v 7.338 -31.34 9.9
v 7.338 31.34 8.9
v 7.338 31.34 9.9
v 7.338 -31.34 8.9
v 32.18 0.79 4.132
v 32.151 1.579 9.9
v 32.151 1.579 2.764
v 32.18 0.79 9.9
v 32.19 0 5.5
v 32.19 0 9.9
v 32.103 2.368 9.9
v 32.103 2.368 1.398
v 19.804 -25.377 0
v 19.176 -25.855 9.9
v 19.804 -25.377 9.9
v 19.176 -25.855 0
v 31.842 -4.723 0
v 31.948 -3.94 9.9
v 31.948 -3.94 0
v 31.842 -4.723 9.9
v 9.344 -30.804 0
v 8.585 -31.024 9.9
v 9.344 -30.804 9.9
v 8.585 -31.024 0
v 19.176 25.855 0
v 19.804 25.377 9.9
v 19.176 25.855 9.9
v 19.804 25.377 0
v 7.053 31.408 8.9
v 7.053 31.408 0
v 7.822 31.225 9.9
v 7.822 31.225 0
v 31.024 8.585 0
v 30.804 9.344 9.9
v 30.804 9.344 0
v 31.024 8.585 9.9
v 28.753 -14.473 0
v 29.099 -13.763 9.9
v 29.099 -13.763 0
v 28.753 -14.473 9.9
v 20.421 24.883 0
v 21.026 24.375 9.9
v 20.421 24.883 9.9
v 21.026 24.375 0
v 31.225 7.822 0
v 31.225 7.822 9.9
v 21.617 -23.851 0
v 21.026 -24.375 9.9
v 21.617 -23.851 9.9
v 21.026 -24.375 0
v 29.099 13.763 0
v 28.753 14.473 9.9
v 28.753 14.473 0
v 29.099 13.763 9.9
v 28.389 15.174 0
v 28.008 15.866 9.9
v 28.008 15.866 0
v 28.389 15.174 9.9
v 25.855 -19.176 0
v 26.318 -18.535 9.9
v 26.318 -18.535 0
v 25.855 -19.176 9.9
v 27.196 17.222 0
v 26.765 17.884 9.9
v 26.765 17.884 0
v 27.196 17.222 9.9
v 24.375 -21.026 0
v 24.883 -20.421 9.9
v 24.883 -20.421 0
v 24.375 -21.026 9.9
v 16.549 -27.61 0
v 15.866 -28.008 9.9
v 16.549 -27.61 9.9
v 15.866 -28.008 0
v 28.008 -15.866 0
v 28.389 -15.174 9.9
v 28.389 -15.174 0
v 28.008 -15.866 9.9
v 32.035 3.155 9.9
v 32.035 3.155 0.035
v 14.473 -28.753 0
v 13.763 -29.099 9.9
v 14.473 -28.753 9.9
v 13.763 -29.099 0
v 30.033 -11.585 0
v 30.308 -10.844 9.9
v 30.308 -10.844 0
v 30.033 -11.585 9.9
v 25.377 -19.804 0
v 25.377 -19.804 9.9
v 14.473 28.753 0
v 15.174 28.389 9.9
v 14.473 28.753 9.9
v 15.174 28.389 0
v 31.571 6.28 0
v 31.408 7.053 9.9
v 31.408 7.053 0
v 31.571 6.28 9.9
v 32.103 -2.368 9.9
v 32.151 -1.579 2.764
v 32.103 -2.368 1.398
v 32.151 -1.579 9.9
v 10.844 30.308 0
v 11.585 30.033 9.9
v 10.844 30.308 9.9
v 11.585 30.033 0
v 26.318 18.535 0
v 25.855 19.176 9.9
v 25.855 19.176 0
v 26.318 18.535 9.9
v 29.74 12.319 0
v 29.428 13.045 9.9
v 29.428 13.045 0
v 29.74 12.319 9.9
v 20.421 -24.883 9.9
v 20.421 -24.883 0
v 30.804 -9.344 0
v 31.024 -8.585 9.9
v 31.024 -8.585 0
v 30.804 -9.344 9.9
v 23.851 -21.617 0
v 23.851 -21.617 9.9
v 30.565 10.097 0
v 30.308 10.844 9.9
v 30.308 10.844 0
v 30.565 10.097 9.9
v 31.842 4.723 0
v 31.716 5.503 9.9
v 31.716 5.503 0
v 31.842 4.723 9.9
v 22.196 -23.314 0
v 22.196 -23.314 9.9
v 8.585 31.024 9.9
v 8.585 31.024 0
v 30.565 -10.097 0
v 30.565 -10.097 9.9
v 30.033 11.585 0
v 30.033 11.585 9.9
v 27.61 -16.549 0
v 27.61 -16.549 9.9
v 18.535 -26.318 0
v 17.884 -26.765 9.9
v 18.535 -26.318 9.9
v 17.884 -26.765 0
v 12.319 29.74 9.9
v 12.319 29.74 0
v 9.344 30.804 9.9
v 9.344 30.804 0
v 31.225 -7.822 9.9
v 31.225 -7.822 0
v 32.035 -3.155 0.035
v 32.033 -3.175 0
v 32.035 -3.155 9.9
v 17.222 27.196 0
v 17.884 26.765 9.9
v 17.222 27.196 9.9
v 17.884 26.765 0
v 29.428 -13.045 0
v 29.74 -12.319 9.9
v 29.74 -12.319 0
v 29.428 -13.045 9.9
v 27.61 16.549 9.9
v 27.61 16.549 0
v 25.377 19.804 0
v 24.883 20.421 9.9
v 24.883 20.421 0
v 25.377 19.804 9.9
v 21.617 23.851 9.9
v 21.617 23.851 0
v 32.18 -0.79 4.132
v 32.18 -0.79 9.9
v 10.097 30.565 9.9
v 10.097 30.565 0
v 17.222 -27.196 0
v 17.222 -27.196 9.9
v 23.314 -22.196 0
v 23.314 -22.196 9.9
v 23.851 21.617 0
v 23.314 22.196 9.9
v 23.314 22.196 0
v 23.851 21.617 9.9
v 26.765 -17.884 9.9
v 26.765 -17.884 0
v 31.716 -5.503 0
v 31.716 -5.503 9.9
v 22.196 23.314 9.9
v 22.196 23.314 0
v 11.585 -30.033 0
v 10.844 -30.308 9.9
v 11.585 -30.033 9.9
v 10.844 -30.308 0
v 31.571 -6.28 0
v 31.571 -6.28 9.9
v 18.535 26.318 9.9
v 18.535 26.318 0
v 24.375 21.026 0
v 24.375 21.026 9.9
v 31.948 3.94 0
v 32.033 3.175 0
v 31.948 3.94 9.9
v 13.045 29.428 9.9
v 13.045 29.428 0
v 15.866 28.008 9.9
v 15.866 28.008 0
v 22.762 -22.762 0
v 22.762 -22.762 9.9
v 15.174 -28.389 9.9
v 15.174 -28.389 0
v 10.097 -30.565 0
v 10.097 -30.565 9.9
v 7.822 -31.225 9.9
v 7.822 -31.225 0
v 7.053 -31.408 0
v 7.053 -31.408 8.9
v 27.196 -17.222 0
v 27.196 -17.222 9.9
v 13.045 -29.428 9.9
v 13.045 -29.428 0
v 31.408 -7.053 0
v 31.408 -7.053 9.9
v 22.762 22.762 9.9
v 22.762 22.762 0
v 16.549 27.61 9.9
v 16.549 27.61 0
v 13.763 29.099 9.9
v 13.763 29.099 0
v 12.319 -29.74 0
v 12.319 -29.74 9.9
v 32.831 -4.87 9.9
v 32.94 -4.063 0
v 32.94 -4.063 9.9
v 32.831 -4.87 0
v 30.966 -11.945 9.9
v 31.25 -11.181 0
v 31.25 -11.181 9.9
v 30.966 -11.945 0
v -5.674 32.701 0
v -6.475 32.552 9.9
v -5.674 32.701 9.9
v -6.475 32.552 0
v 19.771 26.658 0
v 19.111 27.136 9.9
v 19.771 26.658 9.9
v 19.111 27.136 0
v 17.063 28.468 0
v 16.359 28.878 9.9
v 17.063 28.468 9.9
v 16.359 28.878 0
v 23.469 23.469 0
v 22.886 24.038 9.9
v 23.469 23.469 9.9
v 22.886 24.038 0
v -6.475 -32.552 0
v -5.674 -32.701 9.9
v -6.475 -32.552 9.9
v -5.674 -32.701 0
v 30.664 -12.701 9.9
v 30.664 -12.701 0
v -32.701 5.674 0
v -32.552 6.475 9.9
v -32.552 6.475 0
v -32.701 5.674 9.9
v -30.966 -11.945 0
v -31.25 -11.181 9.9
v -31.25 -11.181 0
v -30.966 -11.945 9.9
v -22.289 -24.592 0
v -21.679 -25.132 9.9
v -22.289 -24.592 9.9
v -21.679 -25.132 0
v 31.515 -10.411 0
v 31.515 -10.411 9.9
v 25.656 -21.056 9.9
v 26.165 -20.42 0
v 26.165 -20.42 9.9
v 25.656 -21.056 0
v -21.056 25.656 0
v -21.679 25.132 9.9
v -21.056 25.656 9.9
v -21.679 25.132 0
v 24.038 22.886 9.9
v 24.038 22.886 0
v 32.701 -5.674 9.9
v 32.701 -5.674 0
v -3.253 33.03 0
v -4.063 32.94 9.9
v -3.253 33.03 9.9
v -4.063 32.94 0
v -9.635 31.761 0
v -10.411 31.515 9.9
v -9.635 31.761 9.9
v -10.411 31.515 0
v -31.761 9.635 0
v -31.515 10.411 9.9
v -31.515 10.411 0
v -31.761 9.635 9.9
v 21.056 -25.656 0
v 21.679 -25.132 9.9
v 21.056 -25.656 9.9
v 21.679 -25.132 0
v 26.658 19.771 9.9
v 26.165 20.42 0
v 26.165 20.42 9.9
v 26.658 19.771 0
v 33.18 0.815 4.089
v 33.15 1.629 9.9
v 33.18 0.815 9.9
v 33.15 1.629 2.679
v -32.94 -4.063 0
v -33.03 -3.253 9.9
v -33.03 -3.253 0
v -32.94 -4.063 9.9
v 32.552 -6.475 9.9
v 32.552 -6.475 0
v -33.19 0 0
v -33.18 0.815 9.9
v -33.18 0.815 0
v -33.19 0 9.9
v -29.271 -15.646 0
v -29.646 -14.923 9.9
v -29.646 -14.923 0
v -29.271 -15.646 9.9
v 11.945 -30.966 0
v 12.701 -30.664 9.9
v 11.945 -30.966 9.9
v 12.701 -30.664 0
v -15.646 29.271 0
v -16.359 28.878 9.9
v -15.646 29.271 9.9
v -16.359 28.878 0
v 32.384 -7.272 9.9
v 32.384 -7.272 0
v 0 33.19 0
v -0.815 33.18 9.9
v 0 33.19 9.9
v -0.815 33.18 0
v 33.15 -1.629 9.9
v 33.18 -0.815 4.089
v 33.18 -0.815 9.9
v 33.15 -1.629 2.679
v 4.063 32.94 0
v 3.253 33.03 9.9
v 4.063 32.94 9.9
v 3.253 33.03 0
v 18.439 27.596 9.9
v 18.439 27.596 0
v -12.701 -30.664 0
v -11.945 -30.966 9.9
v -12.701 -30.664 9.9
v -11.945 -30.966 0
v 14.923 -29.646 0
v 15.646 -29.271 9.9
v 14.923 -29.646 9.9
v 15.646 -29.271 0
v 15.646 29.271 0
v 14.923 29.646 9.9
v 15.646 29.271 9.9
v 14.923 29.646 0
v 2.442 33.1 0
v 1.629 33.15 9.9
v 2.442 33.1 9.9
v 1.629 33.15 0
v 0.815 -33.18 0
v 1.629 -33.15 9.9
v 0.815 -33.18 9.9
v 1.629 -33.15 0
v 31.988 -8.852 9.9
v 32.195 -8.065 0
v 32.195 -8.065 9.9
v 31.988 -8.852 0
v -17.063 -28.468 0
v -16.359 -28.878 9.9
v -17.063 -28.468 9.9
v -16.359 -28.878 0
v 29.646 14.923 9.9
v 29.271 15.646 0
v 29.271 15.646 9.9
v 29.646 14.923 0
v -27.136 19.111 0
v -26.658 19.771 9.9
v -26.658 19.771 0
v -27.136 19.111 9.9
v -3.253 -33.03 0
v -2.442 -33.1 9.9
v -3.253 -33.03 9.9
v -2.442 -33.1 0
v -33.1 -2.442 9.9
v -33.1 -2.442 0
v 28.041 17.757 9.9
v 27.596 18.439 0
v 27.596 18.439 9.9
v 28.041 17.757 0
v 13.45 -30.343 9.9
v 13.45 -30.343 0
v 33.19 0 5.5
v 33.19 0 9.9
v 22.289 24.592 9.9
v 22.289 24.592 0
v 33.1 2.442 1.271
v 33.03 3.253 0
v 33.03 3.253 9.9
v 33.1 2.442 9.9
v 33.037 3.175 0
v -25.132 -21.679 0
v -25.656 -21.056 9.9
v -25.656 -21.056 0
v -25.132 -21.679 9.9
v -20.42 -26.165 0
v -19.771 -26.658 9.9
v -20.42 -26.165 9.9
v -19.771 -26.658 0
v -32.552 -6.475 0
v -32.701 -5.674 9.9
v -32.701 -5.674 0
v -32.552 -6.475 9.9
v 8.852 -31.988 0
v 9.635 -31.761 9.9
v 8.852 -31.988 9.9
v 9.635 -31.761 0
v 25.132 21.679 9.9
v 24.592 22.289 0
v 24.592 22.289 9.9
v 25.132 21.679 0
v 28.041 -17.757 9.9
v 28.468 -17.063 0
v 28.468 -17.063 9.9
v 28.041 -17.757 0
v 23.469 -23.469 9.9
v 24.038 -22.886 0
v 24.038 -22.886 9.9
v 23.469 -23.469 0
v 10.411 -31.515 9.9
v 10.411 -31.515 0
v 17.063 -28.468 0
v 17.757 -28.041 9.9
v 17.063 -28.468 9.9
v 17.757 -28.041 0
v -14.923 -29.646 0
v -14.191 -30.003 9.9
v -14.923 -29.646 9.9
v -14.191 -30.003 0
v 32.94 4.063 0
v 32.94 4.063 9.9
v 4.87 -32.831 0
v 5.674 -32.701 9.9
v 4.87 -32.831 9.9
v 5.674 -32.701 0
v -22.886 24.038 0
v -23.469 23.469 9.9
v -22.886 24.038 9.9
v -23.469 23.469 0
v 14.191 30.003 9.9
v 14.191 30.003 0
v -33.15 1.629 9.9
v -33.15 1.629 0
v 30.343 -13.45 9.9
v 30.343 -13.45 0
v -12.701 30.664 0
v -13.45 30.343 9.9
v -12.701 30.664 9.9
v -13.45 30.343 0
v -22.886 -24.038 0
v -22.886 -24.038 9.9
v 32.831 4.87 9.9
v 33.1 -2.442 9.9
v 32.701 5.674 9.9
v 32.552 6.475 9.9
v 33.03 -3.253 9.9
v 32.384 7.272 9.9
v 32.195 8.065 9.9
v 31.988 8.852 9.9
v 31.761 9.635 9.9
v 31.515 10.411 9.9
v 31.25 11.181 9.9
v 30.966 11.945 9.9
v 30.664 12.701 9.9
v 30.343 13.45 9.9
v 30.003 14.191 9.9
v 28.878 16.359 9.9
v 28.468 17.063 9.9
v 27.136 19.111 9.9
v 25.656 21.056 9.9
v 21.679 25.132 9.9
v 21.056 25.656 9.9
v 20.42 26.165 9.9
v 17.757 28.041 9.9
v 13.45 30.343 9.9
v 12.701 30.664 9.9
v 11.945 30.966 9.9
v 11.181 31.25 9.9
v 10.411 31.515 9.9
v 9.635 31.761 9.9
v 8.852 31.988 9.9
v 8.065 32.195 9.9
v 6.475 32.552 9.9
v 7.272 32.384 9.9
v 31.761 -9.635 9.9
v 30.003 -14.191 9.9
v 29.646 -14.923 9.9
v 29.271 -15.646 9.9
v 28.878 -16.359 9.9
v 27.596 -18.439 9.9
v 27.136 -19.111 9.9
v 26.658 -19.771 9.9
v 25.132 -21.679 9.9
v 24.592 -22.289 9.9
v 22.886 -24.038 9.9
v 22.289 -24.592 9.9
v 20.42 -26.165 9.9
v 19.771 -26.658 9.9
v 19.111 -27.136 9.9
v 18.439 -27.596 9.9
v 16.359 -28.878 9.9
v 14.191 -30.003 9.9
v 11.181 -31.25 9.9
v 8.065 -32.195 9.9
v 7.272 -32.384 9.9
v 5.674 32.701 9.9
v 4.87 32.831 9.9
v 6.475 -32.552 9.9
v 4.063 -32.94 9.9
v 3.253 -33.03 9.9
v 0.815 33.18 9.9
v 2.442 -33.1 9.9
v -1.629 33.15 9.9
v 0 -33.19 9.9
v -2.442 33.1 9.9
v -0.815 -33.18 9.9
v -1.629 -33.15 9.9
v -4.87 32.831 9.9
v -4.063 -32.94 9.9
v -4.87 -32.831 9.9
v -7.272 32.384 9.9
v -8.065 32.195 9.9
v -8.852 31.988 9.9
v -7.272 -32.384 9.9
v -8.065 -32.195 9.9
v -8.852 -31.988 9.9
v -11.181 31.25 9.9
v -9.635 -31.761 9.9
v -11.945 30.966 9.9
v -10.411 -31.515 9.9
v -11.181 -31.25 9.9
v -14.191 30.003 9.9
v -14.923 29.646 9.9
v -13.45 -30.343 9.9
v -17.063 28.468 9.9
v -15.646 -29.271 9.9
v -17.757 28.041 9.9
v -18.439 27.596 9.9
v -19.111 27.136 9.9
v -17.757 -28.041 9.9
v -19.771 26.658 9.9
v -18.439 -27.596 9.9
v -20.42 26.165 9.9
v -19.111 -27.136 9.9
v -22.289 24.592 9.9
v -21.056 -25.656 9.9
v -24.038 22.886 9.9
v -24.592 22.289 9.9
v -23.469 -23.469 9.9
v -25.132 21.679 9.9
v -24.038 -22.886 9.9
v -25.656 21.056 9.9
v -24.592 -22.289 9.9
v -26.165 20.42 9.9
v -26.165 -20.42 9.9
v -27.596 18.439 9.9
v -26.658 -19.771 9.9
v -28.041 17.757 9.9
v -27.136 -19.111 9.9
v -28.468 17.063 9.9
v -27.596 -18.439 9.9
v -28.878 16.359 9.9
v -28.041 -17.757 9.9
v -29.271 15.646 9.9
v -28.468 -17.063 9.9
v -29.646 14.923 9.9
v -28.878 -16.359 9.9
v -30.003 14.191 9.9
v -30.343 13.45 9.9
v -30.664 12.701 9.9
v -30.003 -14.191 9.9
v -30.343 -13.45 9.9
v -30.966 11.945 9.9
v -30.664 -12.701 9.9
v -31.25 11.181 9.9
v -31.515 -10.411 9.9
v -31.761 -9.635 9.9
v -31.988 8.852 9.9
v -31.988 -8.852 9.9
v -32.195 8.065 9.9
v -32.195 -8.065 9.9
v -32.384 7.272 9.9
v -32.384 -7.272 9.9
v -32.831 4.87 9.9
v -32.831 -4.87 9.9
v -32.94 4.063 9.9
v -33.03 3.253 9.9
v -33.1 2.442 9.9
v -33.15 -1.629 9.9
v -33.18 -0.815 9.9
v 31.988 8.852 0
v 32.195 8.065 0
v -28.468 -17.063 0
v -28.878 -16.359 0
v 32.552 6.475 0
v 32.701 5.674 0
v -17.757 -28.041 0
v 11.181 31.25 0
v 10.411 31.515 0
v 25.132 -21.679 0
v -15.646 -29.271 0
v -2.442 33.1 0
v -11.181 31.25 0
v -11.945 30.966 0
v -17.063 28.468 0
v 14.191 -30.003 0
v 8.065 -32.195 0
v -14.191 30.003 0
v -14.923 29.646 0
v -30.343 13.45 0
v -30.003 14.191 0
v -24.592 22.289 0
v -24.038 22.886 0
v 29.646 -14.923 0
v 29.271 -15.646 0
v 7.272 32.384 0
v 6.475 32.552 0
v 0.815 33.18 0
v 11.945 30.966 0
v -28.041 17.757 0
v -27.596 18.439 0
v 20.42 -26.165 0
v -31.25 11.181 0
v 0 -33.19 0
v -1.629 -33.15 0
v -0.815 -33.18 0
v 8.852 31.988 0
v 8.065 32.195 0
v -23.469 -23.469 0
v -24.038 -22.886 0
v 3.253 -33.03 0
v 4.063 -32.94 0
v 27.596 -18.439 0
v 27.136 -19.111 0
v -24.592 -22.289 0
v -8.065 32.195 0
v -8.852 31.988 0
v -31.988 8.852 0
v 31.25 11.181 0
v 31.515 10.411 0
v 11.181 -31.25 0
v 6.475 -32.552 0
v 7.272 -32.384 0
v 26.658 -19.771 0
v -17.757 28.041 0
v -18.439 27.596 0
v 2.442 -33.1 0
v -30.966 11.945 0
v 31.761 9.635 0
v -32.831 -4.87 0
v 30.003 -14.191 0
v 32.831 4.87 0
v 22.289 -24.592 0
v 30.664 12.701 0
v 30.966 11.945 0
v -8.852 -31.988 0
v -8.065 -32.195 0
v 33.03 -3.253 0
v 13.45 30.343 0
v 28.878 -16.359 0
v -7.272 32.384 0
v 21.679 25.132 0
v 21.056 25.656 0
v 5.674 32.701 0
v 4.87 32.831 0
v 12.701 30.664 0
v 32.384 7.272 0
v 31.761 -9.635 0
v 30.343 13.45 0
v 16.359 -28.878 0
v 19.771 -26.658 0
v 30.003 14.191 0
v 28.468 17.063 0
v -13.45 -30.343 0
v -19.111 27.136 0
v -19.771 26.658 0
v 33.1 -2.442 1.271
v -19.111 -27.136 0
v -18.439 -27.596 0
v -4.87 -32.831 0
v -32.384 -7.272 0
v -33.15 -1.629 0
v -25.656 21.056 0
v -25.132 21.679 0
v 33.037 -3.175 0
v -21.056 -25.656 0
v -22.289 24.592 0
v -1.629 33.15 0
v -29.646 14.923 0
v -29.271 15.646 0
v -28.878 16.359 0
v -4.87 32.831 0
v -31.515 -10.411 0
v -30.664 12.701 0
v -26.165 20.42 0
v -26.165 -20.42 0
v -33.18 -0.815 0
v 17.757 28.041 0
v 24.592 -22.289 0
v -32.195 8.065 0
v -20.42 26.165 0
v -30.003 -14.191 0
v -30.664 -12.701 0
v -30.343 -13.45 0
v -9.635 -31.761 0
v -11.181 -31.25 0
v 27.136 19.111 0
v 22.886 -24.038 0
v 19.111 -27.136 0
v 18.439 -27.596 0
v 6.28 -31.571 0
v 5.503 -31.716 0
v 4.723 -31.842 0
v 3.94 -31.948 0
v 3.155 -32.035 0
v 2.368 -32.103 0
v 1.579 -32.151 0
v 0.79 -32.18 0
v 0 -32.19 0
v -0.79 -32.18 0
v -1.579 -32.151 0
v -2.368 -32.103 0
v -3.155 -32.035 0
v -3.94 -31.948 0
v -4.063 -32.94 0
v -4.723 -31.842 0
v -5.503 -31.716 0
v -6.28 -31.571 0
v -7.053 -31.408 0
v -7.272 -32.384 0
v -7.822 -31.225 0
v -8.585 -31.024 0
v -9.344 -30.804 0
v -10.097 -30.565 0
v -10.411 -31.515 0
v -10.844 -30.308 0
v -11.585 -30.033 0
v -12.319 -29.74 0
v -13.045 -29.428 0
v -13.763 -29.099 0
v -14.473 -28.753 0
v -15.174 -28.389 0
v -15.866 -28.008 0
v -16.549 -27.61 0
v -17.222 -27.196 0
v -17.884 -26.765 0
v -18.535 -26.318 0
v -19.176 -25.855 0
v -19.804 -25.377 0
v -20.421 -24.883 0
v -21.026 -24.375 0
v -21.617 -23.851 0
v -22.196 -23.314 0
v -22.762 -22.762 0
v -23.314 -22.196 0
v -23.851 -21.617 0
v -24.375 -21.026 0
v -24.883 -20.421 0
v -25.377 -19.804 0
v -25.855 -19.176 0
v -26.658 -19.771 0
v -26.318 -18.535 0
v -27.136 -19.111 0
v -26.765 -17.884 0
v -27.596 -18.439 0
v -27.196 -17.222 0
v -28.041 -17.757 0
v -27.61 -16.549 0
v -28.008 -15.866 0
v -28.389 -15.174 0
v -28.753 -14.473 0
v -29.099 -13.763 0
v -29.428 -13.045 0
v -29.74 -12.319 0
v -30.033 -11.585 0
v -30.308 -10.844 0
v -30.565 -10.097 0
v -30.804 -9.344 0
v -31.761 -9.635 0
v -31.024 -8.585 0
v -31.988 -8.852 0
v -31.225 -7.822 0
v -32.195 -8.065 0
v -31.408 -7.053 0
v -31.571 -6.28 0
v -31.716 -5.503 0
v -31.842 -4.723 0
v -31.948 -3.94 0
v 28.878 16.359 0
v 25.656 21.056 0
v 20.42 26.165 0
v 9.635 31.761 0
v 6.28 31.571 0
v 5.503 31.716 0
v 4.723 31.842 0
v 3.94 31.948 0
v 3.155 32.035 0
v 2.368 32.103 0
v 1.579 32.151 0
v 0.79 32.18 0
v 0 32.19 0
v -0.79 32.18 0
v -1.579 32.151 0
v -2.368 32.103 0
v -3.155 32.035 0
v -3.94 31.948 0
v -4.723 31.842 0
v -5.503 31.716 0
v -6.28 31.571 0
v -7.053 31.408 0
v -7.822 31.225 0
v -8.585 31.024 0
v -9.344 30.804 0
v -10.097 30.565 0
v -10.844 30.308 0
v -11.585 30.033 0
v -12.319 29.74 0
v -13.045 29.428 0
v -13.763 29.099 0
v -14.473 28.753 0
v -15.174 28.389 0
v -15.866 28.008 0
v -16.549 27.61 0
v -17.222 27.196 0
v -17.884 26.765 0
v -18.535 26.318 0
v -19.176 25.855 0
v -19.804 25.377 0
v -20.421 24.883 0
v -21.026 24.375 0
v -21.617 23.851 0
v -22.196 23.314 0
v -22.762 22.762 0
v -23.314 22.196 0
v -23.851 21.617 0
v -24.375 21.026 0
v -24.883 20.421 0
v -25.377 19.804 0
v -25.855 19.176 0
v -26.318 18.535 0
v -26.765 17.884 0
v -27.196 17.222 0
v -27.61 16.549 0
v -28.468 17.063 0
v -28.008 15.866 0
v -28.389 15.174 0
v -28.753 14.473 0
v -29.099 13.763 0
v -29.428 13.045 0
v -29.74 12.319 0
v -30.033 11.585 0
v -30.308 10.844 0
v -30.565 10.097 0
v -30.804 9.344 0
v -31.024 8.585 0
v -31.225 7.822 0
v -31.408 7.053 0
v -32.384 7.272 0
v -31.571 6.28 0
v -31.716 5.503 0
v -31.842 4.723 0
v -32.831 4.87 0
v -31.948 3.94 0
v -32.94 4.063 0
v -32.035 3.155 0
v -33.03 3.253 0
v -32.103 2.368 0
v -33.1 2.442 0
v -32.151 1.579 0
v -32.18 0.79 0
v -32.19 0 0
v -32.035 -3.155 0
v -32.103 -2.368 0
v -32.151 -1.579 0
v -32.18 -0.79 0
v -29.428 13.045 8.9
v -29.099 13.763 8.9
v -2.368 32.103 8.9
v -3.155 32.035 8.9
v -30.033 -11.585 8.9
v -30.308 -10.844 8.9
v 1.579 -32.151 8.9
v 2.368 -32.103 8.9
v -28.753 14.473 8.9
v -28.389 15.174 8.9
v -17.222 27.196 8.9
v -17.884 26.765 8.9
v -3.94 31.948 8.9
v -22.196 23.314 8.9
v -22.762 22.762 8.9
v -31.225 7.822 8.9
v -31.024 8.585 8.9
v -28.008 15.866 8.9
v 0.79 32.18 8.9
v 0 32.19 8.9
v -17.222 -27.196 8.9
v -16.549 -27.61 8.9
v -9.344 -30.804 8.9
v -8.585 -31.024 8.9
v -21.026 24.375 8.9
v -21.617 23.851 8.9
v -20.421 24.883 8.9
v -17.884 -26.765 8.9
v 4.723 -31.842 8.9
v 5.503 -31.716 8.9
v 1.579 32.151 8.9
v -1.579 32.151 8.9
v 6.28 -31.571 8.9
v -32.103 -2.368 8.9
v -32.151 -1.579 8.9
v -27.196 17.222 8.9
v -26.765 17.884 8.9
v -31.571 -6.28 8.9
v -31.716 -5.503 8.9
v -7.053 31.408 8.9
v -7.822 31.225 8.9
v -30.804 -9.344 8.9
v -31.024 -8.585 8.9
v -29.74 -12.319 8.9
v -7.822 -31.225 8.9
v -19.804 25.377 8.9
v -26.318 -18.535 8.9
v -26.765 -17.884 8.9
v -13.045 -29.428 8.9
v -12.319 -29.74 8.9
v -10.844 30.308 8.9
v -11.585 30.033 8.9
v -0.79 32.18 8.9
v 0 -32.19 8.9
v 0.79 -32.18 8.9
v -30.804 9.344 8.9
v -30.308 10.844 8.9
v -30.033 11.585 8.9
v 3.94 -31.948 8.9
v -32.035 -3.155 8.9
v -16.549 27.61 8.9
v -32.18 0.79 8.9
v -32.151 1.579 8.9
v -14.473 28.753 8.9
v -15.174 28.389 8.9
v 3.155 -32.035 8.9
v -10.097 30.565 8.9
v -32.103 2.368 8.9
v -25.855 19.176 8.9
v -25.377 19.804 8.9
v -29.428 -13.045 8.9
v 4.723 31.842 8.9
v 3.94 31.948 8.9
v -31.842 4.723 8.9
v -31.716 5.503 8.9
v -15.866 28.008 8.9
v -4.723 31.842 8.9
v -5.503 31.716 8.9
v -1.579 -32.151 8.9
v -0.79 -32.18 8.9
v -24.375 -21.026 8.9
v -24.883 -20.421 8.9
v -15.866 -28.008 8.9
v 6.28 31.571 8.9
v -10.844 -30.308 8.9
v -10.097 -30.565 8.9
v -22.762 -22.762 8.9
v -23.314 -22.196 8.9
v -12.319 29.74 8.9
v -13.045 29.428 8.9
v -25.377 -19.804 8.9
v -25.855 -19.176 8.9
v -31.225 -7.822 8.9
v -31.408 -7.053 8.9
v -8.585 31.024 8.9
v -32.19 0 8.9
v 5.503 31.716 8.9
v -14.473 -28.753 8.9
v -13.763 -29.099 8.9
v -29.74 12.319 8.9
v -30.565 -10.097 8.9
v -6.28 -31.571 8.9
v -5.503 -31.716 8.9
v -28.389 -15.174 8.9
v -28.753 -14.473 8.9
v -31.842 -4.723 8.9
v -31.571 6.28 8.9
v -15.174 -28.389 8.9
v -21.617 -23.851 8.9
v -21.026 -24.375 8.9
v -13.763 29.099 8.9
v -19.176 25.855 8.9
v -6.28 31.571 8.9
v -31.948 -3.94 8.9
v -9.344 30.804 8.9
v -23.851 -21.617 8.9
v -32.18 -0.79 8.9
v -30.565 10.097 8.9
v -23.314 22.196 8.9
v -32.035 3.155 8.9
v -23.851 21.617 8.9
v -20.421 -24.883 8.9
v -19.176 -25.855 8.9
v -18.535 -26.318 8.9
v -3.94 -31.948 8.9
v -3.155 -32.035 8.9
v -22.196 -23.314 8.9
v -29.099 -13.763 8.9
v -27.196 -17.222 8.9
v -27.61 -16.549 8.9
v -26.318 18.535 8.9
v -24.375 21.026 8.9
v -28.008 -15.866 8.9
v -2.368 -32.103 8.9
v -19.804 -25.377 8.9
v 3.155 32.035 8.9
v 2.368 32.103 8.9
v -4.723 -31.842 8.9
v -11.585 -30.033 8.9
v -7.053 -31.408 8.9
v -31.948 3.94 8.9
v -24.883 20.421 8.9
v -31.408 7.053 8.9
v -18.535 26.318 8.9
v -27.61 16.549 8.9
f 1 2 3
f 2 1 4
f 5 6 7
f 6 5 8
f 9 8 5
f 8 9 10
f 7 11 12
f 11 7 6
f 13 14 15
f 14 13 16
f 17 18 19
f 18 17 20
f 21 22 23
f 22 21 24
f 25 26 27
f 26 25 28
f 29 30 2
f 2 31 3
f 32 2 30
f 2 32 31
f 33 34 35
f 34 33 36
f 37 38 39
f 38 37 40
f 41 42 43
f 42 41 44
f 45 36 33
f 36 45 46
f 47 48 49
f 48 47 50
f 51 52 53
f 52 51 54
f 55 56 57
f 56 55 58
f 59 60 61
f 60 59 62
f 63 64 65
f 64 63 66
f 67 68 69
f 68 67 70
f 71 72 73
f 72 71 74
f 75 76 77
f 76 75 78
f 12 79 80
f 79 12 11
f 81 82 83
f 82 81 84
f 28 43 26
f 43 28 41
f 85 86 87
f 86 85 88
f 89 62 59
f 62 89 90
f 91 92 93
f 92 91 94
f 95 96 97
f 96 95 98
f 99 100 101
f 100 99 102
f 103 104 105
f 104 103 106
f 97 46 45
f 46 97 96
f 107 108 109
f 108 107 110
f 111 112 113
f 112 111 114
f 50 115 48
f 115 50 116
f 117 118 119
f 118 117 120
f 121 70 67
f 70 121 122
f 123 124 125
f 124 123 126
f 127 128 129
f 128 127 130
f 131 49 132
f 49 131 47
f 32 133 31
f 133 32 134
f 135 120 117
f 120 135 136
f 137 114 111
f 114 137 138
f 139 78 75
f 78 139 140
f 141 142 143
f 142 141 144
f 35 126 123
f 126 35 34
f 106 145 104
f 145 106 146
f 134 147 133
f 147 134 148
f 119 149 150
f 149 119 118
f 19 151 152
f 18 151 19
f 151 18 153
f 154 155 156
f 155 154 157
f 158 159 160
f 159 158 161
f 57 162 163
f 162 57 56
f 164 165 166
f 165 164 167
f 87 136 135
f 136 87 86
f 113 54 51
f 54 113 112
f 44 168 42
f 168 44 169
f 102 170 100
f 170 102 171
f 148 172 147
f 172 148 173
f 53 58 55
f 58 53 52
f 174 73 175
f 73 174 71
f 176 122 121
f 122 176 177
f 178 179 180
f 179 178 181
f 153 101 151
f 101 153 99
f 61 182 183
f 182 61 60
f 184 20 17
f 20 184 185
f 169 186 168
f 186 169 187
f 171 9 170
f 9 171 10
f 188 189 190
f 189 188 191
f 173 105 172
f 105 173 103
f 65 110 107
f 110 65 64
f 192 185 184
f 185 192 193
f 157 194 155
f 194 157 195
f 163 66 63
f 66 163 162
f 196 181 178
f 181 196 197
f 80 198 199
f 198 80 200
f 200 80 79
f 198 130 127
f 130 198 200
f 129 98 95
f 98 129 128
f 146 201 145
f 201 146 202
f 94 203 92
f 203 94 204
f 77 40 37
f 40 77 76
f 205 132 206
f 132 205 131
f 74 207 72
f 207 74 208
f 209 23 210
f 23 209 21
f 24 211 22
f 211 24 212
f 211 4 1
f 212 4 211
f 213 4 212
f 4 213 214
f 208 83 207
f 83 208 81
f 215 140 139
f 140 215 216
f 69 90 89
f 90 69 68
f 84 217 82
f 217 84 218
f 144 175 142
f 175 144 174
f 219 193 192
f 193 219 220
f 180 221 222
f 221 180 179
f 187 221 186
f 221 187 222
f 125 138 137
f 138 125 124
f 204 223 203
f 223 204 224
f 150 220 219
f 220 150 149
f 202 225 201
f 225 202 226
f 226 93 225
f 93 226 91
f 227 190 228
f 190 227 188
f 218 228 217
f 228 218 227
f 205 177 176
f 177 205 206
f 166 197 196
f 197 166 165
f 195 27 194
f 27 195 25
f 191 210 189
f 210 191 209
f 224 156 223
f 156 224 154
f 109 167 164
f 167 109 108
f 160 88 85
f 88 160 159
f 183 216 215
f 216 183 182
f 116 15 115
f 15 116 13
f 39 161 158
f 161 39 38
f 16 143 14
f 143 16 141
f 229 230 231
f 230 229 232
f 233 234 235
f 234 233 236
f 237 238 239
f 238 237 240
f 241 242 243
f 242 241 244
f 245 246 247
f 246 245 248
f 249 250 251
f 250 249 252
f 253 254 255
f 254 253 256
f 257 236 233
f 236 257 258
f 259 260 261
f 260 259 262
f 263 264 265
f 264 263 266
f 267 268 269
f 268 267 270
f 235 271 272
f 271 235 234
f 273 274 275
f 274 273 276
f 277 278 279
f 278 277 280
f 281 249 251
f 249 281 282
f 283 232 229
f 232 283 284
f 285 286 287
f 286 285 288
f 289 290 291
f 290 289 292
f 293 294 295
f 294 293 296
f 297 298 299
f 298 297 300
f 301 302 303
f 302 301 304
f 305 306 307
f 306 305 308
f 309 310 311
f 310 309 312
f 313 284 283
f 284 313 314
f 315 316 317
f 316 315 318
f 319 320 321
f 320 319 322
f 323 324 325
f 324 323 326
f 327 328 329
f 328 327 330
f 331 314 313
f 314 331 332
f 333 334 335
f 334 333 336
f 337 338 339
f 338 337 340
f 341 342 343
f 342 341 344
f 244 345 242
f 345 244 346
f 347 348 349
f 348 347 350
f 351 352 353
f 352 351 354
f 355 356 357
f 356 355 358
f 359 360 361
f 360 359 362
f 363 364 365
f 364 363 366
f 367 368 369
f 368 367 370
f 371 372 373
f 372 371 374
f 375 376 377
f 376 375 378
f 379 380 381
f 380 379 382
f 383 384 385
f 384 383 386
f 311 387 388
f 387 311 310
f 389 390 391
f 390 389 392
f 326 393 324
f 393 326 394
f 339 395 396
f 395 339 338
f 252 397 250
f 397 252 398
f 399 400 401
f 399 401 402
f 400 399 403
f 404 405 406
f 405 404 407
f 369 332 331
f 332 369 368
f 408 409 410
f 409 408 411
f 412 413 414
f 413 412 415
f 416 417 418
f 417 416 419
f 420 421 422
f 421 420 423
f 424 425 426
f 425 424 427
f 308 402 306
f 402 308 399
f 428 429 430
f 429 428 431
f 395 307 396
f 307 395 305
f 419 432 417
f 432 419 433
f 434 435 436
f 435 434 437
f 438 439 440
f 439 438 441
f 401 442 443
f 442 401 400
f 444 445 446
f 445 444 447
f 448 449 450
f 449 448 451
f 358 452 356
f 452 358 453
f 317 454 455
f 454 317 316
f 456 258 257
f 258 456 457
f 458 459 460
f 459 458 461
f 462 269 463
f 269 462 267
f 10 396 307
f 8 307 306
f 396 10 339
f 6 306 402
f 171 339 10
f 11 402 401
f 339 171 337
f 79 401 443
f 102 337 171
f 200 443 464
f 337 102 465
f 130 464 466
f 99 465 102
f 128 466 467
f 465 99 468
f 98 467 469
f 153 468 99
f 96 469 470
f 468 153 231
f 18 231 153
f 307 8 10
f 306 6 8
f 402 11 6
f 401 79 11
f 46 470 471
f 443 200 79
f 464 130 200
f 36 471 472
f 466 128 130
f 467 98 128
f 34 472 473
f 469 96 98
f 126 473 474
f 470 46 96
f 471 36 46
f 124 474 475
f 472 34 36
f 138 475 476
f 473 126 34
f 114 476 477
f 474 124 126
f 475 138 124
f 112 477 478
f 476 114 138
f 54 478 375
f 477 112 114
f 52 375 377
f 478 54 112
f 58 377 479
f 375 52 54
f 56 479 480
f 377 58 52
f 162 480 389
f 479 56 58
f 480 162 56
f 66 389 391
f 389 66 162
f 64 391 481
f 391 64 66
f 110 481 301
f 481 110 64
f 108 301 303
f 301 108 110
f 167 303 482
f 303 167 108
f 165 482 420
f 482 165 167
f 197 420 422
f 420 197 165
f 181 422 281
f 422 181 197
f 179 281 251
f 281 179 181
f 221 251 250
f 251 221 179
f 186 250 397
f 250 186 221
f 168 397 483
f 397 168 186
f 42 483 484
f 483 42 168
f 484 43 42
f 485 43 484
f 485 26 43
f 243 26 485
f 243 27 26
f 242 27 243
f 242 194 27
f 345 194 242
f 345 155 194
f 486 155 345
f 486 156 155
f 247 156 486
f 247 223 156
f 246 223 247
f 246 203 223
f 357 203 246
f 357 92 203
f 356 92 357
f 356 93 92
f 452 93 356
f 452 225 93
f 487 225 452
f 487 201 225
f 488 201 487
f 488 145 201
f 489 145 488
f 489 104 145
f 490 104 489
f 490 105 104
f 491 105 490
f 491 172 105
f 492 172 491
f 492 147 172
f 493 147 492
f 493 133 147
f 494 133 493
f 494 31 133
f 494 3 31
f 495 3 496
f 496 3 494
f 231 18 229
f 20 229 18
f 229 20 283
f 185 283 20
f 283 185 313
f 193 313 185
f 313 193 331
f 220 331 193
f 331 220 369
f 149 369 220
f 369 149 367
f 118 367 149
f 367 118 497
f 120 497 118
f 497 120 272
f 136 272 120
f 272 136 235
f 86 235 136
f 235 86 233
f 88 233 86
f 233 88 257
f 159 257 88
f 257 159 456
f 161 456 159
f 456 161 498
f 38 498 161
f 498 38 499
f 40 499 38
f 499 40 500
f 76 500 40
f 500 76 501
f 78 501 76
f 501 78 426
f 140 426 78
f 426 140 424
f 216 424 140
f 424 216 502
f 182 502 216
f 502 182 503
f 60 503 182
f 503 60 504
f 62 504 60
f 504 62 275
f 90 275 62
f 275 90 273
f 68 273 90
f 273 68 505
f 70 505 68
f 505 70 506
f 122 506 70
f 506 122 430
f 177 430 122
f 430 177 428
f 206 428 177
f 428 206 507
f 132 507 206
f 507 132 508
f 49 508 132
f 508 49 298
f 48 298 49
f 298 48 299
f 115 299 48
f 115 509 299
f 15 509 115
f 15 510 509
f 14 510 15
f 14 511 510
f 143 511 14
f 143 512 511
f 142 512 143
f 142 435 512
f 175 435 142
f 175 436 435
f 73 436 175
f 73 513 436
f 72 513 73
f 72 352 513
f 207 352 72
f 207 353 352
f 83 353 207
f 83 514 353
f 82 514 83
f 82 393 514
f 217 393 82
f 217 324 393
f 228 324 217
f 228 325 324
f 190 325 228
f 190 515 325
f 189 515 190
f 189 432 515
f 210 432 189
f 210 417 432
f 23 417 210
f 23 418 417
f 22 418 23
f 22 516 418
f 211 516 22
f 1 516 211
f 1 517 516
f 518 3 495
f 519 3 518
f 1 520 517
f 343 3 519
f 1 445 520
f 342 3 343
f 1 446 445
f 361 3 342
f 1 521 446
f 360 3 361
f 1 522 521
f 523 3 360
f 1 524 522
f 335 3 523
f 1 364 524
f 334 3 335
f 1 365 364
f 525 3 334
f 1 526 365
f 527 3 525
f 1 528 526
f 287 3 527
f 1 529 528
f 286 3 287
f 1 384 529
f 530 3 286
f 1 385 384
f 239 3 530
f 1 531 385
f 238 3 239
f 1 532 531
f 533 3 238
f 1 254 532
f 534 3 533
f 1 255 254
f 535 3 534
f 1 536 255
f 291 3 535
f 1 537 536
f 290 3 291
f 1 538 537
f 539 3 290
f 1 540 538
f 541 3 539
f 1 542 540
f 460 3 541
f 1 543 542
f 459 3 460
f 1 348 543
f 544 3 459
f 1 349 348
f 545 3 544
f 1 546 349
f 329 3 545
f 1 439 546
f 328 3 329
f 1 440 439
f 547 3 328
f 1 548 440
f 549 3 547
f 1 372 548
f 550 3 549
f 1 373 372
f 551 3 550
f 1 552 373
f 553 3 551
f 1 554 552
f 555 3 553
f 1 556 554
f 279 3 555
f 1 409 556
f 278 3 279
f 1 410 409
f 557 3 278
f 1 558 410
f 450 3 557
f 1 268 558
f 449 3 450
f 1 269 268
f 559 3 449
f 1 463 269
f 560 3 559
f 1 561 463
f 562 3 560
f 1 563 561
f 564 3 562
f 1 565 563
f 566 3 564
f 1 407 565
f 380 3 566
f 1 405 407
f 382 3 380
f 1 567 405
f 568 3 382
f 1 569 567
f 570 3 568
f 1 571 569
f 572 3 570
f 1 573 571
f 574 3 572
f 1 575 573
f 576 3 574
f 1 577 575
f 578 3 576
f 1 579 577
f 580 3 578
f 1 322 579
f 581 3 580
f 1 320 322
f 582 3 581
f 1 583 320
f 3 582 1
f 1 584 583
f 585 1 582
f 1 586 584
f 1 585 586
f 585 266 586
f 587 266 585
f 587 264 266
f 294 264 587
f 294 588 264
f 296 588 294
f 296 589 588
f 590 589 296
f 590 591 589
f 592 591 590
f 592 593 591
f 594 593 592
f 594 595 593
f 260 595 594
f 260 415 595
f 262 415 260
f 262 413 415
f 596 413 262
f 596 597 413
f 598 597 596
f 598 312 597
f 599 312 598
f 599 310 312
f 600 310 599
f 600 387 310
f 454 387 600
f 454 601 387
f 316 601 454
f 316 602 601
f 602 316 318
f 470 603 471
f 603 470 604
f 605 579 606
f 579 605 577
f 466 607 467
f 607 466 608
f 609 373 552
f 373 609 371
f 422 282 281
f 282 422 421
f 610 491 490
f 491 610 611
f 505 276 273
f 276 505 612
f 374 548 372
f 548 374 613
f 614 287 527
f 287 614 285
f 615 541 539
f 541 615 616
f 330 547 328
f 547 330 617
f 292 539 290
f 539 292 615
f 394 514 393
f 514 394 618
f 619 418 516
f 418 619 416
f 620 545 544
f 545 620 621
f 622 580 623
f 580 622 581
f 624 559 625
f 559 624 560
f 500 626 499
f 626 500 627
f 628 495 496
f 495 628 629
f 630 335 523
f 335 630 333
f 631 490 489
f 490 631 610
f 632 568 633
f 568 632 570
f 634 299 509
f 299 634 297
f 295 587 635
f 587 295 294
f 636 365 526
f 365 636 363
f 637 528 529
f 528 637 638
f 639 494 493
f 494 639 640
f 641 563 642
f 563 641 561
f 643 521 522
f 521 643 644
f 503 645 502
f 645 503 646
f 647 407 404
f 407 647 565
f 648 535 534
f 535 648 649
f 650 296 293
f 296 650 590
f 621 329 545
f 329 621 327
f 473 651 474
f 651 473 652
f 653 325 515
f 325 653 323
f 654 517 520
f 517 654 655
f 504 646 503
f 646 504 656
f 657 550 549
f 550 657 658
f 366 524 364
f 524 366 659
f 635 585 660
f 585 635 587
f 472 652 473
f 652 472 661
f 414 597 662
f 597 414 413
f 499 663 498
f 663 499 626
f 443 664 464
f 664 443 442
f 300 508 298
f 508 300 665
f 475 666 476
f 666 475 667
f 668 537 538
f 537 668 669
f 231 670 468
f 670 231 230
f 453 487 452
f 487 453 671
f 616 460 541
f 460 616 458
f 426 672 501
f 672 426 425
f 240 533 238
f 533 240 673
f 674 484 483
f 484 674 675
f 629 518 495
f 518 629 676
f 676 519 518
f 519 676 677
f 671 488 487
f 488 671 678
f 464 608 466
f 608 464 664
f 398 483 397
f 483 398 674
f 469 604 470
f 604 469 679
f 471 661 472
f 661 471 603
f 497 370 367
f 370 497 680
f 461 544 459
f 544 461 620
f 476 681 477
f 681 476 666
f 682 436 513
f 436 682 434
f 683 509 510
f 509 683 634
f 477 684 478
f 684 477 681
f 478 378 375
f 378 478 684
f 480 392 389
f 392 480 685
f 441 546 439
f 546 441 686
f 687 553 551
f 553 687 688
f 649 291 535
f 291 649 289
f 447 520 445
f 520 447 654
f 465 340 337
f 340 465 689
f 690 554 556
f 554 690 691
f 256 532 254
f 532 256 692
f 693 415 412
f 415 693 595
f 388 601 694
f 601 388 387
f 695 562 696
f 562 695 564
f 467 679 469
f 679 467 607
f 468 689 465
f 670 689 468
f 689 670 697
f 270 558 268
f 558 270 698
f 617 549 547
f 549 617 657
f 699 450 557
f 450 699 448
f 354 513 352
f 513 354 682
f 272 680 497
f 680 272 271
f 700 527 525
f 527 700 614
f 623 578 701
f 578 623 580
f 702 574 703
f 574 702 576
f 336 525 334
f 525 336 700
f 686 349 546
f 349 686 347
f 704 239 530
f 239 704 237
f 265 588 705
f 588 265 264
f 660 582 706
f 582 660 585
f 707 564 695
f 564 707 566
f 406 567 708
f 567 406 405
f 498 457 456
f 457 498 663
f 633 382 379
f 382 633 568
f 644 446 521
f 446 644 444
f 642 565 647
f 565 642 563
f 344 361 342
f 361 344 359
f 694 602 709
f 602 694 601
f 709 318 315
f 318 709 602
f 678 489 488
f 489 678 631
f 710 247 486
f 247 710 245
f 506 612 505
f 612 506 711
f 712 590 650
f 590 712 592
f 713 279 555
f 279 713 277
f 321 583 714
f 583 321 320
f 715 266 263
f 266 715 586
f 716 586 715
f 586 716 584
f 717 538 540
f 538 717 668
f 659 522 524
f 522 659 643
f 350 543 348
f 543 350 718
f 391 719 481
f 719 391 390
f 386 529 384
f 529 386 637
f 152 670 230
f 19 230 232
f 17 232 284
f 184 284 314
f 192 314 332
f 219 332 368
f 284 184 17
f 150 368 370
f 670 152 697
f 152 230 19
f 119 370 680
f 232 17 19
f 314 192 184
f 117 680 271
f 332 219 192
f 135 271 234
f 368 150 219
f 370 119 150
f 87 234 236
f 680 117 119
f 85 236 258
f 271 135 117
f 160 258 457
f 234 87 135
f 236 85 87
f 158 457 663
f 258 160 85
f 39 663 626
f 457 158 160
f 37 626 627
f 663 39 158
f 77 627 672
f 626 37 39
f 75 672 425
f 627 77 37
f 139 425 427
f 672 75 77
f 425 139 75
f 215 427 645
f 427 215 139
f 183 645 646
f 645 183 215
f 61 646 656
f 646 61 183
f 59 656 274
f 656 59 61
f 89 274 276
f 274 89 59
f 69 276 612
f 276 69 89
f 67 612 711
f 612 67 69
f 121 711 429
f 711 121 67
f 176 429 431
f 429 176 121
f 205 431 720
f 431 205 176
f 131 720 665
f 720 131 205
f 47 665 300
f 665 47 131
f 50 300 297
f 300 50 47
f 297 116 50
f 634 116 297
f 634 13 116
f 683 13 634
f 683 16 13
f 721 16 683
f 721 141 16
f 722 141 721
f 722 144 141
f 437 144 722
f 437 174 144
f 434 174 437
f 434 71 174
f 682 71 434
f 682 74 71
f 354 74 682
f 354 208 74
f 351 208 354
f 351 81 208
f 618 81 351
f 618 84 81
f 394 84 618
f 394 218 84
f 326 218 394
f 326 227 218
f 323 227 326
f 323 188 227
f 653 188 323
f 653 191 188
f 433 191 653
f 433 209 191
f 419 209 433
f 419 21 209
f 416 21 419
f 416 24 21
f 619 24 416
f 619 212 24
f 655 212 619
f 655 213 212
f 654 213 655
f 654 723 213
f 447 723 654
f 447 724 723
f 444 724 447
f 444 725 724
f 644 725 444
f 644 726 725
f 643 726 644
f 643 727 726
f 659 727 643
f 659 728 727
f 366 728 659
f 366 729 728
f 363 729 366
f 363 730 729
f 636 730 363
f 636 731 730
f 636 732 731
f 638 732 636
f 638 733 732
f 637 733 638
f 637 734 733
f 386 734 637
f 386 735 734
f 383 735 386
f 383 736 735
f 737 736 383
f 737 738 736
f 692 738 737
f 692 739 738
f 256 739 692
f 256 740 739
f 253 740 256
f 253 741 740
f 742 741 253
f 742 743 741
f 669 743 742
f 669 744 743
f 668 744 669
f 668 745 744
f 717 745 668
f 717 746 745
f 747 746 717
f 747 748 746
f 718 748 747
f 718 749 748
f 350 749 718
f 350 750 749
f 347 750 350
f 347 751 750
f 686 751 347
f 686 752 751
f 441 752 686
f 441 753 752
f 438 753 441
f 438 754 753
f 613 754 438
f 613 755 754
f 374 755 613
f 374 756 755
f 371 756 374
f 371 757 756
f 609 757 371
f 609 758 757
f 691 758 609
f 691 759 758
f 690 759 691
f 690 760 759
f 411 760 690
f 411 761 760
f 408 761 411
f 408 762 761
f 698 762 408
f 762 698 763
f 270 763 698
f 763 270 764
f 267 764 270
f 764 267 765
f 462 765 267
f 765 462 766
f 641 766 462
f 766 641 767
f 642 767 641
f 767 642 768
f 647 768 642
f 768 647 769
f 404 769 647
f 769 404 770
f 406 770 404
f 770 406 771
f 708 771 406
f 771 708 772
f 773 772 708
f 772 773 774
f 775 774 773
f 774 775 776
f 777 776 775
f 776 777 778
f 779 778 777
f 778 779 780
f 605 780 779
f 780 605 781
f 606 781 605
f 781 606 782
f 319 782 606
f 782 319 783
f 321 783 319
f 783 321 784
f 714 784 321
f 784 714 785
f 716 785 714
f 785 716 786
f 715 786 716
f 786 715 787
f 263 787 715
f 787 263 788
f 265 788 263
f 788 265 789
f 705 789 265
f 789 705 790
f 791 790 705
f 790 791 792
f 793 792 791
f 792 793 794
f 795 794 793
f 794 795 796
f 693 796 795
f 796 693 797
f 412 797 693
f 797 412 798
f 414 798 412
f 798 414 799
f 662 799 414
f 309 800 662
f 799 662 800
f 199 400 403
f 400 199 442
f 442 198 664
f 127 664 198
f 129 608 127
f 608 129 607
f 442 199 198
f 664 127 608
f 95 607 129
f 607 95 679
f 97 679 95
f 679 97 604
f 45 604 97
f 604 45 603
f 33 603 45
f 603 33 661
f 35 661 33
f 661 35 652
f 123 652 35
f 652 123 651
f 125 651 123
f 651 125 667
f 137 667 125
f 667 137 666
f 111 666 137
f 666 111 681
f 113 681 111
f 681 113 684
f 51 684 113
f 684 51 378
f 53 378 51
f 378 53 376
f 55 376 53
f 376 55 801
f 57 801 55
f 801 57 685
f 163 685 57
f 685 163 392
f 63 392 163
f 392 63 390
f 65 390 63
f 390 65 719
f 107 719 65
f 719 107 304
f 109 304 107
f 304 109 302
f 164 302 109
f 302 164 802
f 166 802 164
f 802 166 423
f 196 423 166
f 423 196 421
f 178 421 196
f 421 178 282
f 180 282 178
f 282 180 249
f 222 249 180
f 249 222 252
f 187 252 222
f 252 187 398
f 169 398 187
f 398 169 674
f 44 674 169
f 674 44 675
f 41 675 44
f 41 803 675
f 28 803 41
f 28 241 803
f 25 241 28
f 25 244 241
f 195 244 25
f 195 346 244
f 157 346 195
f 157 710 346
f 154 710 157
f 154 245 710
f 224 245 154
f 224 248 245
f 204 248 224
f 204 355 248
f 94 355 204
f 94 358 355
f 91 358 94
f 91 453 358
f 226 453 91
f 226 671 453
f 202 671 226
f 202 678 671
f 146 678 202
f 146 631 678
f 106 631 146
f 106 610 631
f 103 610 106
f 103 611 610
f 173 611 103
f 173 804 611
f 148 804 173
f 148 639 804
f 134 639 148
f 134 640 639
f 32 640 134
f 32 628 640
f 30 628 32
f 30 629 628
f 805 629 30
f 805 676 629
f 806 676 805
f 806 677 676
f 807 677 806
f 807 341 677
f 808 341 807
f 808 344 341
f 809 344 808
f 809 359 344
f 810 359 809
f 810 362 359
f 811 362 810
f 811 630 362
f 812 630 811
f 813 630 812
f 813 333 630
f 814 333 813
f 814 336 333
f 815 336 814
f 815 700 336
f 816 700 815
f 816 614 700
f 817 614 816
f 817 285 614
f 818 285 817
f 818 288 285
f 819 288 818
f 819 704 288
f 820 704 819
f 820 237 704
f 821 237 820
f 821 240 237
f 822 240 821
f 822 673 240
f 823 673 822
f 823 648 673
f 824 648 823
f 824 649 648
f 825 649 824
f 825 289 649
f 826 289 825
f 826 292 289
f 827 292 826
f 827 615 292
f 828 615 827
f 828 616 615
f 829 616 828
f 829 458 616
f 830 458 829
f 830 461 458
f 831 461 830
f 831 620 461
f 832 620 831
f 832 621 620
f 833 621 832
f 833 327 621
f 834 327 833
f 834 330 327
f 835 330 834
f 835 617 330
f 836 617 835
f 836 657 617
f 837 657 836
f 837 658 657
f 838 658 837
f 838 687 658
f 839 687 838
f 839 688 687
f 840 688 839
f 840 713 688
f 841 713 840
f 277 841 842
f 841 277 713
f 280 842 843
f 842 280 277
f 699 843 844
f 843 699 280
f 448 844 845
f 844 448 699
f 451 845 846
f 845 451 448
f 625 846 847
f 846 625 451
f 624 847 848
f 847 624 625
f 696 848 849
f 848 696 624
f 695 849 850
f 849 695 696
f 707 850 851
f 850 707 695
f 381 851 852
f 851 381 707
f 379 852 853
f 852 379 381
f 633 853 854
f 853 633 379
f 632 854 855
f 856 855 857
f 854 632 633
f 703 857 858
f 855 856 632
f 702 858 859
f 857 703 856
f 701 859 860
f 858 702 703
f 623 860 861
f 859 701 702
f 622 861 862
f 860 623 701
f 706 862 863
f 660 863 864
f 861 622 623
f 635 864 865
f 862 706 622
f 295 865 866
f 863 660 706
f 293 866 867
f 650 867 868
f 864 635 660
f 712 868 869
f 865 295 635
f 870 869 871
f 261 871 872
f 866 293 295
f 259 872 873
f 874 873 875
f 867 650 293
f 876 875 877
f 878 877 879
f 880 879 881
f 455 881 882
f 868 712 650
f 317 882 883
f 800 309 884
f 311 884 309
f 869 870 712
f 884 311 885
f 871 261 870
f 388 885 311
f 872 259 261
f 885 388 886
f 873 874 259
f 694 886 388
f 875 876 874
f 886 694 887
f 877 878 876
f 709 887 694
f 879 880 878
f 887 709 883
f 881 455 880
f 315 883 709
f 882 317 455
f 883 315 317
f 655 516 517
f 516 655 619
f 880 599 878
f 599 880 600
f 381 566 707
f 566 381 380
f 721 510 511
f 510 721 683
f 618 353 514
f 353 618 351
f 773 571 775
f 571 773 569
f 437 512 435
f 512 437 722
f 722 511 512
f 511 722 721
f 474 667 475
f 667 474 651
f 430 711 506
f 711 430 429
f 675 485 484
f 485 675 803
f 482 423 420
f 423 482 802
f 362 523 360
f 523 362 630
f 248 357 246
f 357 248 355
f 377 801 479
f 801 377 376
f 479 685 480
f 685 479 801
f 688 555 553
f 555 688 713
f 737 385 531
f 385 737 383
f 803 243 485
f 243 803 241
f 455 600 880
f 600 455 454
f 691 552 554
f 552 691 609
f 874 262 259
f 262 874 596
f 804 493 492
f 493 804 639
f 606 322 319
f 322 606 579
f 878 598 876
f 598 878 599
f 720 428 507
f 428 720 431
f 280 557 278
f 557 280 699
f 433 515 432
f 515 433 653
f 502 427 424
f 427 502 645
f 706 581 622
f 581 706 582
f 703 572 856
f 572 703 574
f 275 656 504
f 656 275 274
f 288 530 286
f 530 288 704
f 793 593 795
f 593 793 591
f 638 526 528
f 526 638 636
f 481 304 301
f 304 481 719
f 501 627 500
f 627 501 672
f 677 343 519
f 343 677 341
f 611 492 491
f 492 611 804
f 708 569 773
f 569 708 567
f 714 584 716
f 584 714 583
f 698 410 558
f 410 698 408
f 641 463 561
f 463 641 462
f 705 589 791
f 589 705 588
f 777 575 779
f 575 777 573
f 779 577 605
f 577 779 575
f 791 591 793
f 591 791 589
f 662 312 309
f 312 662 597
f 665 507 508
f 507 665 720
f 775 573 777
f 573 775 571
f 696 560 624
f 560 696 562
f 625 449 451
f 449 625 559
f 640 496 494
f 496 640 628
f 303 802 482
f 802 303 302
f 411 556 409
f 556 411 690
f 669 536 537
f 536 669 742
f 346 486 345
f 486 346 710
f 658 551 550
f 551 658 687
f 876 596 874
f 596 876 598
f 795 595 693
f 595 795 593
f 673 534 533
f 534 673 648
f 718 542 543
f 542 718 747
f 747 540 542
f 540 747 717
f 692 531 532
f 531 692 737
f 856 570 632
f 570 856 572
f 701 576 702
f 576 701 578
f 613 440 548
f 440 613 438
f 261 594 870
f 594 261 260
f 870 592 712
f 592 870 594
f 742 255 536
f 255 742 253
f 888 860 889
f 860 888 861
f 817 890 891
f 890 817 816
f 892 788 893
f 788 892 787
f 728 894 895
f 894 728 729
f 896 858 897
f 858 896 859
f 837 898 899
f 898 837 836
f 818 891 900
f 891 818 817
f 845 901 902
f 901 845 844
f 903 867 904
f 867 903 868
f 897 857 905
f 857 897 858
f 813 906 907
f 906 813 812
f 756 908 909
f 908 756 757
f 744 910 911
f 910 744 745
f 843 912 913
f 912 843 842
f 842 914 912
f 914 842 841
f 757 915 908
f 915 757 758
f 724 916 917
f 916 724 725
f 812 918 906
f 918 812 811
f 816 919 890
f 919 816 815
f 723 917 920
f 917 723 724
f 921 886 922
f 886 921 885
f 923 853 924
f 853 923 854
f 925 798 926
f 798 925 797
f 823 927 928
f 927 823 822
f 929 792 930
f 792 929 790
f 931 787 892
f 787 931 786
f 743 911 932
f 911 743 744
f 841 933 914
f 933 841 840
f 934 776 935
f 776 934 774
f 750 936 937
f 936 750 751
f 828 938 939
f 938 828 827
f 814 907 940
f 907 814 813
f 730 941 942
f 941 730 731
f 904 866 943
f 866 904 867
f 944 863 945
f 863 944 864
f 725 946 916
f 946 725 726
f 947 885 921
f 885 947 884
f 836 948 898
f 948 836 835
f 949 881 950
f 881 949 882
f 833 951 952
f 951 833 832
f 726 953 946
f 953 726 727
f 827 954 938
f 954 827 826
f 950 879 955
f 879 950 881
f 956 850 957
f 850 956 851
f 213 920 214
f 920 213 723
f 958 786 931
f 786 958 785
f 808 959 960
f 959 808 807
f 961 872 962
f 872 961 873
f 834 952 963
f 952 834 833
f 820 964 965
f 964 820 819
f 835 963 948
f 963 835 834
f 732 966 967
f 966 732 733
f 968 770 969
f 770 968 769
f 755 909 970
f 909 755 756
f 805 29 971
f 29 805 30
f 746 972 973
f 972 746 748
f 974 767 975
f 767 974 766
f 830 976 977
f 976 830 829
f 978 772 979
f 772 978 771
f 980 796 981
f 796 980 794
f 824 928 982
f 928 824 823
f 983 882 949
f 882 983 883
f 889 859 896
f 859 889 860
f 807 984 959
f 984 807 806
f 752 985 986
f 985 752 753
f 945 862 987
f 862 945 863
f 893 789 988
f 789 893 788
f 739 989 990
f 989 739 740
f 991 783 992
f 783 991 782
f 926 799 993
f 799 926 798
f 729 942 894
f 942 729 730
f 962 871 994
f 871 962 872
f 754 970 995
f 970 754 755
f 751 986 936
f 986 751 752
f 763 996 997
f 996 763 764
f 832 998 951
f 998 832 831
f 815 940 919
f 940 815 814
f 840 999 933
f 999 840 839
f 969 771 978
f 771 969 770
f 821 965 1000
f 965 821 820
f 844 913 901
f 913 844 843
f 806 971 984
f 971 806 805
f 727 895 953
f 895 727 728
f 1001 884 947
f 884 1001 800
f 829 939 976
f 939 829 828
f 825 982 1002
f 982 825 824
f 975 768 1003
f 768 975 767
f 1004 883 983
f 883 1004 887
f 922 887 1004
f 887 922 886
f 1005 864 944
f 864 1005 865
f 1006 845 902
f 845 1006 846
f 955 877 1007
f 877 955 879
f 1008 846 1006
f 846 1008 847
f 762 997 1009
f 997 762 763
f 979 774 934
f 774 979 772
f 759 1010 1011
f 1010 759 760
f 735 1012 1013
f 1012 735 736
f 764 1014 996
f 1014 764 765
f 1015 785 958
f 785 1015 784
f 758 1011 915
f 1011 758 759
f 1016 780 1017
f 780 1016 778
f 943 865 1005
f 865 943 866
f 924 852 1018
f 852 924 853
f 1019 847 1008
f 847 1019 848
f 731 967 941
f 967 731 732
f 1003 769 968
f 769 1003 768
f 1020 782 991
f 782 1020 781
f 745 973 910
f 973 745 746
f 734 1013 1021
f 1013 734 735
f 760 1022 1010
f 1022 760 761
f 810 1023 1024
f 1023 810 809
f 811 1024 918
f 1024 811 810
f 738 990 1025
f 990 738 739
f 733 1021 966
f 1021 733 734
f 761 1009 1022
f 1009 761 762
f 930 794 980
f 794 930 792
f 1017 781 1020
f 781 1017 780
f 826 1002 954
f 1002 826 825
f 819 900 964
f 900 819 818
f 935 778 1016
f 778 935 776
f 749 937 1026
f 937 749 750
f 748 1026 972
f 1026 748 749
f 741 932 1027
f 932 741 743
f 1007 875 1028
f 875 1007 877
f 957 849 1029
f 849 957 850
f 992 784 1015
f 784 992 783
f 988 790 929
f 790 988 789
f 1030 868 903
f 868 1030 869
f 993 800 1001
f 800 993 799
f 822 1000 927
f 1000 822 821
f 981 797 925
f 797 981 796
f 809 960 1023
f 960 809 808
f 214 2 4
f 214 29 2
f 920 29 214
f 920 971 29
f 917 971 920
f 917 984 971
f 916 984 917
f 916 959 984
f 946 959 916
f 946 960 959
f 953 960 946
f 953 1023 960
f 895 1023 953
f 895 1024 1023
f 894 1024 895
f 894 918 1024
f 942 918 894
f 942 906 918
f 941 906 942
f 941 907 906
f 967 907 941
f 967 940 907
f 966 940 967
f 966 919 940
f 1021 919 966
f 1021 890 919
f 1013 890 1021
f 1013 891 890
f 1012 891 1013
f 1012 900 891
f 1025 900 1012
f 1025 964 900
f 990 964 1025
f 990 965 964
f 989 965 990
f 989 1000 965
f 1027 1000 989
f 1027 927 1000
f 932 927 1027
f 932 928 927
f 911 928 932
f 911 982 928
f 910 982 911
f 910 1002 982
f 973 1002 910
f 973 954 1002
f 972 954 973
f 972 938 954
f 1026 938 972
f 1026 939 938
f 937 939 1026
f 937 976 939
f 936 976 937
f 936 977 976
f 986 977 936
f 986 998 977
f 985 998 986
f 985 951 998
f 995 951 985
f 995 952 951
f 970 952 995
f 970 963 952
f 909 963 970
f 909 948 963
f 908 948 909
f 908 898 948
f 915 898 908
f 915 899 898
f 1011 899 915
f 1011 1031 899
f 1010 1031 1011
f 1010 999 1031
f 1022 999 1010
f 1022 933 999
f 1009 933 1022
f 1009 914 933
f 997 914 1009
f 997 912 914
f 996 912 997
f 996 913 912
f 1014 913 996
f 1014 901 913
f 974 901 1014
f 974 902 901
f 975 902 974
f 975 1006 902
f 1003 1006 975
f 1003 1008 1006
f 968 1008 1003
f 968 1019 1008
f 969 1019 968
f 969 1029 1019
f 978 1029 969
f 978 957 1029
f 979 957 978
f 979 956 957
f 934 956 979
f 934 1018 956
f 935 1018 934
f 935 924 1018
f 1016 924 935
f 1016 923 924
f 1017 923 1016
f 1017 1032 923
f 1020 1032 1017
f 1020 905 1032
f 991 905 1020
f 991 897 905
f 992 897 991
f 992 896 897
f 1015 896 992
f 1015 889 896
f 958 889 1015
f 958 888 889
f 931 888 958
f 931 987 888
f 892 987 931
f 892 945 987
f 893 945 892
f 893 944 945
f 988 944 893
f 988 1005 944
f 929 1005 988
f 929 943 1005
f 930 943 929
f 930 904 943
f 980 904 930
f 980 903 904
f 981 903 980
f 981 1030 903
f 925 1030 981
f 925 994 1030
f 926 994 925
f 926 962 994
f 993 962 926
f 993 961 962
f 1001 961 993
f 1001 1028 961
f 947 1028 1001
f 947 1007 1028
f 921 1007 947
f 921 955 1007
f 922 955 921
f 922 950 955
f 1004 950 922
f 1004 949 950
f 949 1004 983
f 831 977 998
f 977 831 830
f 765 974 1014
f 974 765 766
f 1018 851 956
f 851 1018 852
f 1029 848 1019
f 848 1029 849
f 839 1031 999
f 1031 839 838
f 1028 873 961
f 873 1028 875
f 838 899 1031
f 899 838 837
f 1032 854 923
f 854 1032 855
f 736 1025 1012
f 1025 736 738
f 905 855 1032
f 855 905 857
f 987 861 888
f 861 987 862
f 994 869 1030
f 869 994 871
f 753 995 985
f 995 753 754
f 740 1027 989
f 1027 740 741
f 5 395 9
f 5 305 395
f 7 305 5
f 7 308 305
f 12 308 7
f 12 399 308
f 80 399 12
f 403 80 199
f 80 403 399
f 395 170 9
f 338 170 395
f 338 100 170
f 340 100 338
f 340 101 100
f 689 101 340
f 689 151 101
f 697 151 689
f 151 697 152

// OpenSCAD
$fn = 256;

module singulator_shield(socket_diameter, socket_depth, candy_height, wall_thickness) {
    tweak_factor = 1.1;
    cuff_diameter = socket_diameter+wall_thickness*2;
    difference() {
        cylinder(candy_height*tweak_factor,d=(cuff_diameter-wall_thickness*2)-1);
        // interior
        translate([0,0,-1])
            cylinder(candy_height*tweak_factor,d=(cuff_diameter-wall_thickness*2)-3);
            
        // top gap in shield
        intersection() {
            translate([cuff_diameter*0.1,-cuff_diameter/2,candy_height*tweak_factor-wall_thickness-0.1])
                cube(cuff_diameter);
            translate([0,0,5])
                cylinder(candy_height*tweak_factor,d=(cuff_diameter-wall_thickness*2)-3);
        }
        // gap for key
        translate([cuff_diameter/2,0,1.5])
            rotate([0,-90,0])
                cylinder(20,d=socket_depth/2+1,$fn=3); 
        }
    
}

mason_jar_outer_diameter = 67.38;
skittle_diameter = 13;
skittle_height = 9;
cuff_height = 14;
wall_thickness = 3;

singulator_shield(mason_jar_outer_diameter,cuff_height,skittle_height,wall_thickness);
